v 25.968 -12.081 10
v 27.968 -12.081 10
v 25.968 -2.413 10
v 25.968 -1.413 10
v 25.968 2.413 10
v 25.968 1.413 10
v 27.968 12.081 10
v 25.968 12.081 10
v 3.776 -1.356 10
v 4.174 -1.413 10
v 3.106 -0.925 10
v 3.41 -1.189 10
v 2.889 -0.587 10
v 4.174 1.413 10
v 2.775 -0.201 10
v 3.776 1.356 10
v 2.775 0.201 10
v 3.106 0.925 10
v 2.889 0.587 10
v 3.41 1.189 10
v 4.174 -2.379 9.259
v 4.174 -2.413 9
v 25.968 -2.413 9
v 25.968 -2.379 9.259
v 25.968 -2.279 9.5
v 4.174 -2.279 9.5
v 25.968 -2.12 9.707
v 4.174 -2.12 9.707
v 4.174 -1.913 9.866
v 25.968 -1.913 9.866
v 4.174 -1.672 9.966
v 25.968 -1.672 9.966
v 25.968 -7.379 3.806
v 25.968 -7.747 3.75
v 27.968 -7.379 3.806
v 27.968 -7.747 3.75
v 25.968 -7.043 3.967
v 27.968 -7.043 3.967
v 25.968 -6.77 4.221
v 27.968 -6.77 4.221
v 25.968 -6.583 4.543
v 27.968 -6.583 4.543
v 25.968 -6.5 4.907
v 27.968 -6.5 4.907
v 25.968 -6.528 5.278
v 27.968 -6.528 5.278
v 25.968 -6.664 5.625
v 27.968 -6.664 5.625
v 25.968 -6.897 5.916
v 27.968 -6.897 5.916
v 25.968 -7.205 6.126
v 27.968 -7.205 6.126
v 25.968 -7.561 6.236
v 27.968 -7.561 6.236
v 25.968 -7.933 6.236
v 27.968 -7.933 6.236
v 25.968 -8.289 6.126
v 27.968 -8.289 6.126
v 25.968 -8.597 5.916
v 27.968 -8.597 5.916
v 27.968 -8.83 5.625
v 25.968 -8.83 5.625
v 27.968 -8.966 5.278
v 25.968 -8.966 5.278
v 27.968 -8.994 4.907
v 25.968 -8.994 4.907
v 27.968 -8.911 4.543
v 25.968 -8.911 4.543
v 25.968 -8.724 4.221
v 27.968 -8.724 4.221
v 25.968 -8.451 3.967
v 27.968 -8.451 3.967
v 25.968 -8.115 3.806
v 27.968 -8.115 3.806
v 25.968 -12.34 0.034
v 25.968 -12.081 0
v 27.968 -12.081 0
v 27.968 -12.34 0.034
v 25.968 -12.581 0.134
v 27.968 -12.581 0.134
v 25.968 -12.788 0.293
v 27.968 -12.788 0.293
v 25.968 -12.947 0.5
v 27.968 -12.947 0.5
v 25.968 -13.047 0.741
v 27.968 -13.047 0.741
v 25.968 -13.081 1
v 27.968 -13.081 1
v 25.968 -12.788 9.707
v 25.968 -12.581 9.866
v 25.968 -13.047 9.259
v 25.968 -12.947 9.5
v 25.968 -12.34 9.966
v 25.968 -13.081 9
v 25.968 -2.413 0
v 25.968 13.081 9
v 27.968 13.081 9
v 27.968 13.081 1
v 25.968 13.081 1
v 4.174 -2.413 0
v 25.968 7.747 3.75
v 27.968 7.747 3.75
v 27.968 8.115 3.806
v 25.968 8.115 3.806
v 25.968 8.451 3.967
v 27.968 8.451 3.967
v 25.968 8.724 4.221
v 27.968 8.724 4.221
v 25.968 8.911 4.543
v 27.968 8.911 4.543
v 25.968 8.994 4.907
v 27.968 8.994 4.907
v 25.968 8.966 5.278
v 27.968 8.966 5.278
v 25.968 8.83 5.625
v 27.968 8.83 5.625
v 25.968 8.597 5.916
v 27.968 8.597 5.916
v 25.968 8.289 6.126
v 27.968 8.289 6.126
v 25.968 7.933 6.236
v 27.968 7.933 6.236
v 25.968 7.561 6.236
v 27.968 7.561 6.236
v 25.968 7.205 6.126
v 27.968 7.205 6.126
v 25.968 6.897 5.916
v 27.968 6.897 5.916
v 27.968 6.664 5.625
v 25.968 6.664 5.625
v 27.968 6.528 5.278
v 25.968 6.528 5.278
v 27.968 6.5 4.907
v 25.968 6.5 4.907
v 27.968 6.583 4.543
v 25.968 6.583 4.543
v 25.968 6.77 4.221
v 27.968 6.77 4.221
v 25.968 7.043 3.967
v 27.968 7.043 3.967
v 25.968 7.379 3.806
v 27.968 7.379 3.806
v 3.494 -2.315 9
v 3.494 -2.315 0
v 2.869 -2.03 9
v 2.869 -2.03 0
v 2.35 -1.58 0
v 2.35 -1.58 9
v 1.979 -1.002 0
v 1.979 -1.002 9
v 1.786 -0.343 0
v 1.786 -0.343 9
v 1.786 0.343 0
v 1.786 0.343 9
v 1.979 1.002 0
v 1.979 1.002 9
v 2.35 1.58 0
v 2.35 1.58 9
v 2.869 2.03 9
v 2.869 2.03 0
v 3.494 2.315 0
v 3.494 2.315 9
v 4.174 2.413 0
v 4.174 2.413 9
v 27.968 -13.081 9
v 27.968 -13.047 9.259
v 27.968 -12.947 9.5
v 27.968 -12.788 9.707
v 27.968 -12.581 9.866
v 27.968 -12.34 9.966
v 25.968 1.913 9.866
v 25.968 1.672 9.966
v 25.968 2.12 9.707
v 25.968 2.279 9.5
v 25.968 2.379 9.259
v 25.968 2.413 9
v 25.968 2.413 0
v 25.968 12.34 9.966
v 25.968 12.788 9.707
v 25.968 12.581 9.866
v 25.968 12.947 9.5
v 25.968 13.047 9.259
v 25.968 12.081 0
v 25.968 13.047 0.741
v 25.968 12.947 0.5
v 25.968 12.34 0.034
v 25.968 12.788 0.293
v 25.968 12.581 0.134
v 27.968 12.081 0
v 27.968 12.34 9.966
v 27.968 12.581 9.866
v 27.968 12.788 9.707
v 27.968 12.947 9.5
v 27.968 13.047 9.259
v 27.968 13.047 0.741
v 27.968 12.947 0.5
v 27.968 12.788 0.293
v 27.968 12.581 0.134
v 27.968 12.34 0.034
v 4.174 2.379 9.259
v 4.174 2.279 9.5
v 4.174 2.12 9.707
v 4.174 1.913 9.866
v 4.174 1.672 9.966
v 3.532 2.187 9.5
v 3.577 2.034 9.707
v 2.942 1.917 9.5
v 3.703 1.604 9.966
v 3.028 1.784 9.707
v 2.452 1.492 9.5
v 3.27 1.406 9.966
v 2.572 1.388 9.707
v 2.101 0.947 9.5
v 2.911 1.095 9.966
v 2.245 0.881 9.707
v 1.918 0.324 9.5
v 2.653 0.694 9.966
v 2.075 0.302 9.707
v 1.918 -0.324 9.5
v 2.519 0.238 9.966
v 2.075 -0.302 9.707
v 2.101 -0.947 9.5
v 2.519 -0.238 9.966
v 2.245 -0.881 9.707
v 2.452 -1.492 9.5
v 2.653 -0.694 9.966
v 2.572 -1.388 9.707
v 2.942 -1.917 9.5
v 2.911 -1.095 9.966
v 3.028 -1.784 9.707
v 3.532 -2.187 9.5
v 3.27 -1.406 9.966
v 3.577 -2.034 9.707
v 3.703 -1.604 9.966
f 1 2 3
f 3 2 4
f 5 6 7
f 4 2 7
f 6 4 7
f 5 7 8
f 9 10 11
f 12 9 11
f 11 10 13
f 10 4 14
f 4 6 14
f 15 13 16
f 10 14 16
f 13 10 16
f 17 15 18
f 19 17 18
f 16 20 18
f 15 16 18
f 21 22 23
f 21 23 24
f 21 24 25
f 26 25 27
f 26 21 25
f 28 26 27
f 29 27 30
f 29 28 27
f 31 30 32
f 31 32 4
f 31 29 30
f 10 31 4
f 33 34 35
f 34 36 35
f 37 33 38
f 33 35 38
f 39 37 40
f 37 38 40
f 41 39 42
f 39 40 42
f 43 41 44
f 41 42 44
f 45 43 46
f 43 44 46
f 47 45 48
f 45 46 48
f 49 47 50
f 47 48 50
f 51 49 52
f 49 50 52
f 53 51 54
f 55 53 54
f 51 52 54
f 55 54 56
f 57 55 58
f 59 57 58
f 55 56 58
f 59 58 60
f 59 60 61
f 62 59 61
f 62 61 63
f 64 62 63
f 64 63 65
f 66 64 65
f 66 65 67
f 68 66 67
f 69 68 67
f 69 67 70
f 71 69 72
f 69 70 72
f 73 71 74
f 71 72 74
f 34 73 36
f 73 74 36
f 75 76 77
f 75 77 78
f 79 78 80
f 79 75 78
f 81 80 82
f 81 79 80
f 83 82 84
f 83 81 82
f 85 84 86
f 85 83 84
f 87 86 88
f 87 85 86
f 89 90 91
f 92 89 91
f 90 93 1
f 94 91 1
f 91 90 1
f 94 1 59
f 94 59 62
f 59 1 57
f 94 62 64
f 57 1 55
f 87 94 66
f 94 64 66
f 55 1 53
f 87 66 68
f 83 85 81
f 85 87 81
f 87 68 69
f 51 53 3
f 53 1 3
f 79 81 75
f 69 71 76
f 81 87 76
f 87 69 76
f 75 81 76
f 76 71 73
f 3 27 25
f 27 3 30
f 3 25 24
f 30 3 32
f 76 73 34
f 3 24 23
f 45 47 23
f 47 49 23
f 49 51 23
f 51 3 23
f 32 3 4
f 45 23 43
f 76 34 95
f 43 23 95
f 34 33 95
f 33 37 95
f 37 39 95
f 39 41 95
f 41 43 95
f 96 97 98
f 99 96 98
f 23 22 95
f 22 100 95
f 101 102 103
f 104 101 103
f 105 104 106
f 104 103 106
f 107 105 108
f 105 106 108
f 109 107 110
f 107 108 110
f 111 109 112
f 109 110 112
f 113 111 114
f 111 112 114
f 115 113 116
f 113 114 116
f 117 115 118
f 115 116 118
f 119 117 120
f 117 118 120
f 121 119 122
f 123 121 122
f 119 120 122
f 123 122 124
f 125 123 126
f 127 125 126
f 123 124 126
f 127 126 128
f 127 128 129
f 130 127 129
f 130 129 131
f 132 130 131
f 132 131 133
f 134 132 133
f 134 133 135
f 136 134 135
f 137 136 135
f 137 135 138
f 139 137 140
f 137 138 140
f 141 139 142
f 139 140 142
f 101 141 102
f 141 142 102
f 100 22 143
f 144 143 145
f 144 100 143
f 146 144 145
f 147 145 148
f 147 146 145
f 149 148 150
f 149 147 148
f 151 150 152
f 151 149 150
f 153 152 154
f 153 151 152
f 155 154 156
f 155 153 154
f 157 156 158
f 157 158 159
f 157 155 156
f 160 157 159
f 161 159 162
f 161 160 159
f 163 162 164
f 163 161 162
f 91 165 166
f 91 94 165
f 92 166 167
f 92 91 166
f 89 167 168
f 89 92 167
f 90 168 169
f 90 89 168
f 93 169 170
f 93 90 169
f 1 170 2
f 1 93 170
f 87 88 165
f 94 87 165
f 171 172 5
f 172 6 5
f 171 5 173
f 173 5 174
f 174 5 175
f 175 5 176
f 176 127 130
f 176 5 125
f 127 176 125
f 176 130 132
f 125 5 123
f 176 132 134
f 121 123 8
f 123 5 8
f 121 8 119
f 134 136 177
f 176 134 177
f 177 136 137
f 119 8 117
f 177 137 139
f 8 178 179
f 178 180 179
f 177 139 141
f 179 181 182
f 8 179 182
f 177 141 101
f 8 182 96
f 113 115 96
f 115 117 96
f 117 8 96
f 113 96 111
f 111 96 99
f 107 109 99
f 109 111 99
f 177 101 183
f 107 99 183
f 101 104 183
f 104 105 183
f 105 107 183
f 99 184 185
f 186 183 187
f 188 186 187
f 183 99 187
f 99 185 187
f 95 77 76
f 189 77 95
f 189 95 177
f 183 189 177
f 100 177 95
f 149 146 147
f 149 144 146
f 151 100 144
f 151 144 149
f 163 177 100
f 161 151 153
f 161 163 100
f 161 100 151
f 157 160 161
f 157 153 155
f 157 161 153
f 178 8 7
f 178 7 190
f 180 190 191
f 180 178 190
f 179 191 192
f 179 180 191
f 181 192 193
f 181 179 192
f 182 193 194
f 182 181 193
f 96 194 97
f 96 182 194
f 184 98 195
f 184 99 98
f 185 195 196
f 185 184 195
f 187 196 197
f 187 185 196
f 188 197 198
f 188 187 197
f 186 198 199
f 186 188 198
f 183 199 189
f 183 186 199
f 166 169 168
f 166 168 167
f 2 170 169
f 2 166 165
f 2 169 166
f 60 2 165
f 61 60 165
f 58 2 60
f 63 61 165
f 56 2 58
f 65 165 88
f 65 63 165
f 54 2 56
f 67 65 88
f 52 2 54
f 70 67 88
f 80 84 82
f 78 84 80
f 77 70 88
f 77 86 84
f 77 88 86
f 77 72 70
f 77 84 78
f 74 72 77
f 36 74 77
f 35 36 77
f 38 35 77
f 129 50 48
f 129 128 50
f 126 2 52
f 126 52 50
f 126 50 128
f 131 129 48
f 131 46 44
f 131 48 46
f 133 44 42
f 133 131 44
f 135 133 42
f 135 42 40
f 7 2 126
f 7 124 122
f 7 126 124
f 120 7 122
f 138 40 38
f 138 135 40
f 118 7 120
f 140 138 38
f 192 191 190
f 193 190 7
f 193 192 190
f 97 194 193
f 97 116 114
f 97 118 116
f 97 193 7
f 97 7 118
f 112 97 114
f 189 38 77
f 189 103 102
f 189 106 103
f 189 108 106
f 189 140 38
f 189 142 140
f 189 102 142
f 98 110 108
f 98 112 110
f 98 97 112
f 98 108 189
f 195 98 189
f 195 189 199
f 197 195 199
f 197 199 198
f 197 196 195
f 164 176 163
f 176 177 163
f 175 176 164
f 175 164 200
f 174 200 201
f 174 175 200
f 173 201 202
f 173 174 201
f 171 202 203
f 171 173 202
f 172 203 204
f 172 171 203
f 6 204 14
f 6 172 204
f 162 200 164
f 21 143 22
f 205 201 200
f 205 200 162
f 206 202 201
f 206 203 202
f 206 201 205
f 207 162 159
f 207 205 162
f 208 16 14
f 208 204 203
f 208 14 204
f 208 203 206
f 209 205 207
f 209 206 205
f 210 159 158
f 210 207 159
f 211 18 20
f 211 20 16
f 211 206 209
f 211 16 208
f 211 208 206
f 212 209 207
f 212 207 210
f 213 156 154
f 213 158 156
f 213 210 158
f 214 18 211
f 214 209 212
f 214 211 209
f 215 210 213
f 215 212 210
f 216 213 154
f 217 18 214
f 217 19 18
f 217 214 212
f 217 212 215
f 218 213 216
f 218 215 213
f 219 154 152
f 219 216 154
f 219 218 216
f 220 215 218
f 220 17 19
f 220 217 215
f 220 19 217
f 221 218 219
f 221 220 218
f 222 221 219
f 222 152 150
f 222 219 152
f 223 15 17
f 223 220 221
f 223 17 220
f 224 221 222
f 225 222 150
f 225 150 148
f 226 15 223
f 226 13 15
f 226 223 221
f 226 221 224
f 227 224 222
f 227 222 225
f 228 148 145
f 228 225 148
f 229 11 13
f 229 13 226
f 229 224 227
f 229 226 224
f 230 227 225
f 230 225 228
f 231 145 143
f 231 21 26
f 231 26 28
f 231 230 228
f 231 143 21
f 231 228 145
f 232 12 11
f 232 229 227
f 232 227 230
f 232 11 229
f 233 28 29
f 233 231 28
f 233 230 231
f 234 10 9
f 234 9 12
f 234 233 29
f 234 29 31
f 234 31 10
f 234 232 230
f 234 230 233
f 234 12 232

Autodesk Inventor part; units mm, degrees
ref_plane "YZ Plane" through (0, 0, 0) normal (1, 0, 0) x (0, 1, 0)
ref_plane "XZ Plane" through (0, 0, 0) normal (0, 1, 0) x (-1, 0, 0)
sketch "Sketch1" plane through (0, 0, 0) normal (0, 0, 1) x (1, 0, 0)
  line L0 (-4.826, 0.413) -> (-4.826, -0.413) projected
  line L1 (-2.826, -2.413) -> (4.826, -2.413) projected
  line L2 (4.826, -2.413) -> (4.826, 2.413) projected
  line L3 (4.826, 2.413) -> (-2.826, 2.413) projected
  arc A0 (-4.826, -0.413) -> (-2.826, -2.413) centre (-2.826, -0.413) ccw projected
  arc A1 (-2.826, 2.413) -> (-4.826, 0.413) centre (-2.826, 0.413) ccw projected
  point P0 (0, 0)
extrude "Extrusion1" add sketch "Sketch1" along normal blind 10
sketch "Sketch2" plane through (4.826, -2.413, 0) normal (1, 0, 0) x (0, 0, -1)
  line L0 (0, 0) -> (-10, 0) projected
  line L1 (-10, 0) -> (-10, 4.826) projected
  circle A0 centre (3.175, 150.3292) radius 1.5 projected
  circle A1 centre (3.175, 23.749) radius 1.5 projected
  circle A2 centre (73.025, 23.749) radius 1.5 projected
  circle A3 centre (73.025, 150.3292) radius 1.5 projected
  arc A4 (60.2046, 236.2874) -> (0.9041, 211.5001) centre (77.9391, 110.5317) ccw projected
  ellipse E0 centre (170.686, 87.0391) end of major axis (408.43, 87.0391) minor radius 177.8 (0.9041, 211.5001) -> (0.9041, -37.4219) ccw projected
  arc A5 (0.9041, -37.4219) -> (60.2046, -62.2092) centre (77.9391, 63.5465) ccw projected
  arc A6 (60.2046, -62.2092) -> (281.1673, -62.2092) centre (170.686, 721.2179) ccw projected
  arc A7 (281.1673, -62.2092) -> (340.4678, -37.4219) centre (263.4329, 63.5465) ccw projected
  ellipse E1 centre (170.686, 87.0391) end of major axis (408.43, 87.0391) minor radius 177.8 (340.4678, -37.4219) -> (340.4678, 211.5001) ccw projected
  arc A8 (340.4678, 211.5001) -> (281.1673, 236.2874) centre (263.4329, 110.5317) ccw projected
  arc A9 (281.1673, 236.2874) -> (60.2046, 236.2874) centre (170.686, -547.1397) ccw projected
  circle A10 centre (18.1159, 118.5546) radius 1.25 projected
  circle A11 centre (-51.7341, 53.7756) radius 1.25 projected
  circle A12 centre (18.1159, 53.7756) radius 1.25 projected
  circle A13 centre (-51.7341, 118.5546) radius 1.25 projected
  circle A14 centre (395.605, 77.7641) radius 1.25 projected
  circle A15 centre (321.1037, 62.7821) radius 1.25 projected
  circle A16 centre (321.1037, 101.1361) radius 1.25 projected
  circle A17 centre (395.605, 96.3141) radius 1.25 projected
  line L2 (284.5488, 72.0792) -> (223.628, 72.0792) projected
  line L3 (223.628, 72.0792) -> (223.628, 102.5592) projected
  line L4 (223.628, 102.5592) -> (284.5488, 102.5592) projected
  line L5 (284.5488, 102.5592) -> (284.5488, 72.0792) projected
  circle A18 centre (129.4087, 87.0391) radius 30.4 projected
  line L6 (95.6616, 45.3432) -> (95.6616, 49.3432) projected
  arc A19 (98.6614, 49.3432) -> (95.6616, 49.3432) centre (97.1615, 49.3432) ccw projected
  line L7 (98.6614, 49.3432) -> (98.6614, 45.3432) projected
  arc A20 (95.6616, 45.3432) -> (98.6614, 45.3432) centre (97.1615, 45.3432) ccw projected
  line L8 (160.3503, 45.3892) -> (160.3503, 49.3892) projected
  arc A21 (163.3501, 49.3892) -> (160.3503, 49.3892) centre (161.8502, 49.3892) ccw projected
  line L9 (163.3501, 49.3892) -> (163.3501, 45.3892) projected
  arc A22 (160.3503, 45.3892) -> (163.3501, 45.3892) centre (161.8502, 45.3892) ccw projected
  line L10 (95.5803, 159.8921) -> (95.5803, 163.8921) projected
  arc A23 (98.5801, 163.8921) -> (95.5803, 163.8921) centre (97.0802, 163.8921) ccw projected
  line L11 (98.5801, 163.8921) -> (98.5801, 159.8921) projected
  arc A24 (95.5803, 159.8921) -> (98.5801, 159.8921) centre (97.0802, 159.8921) ccw projected
  line L12 (163.3504, 163.8921) -> (163.3504, 159.8921) projected
  arc A25 (160.3506, 159.8921) -> (163.3504, 159.8921) centre (161.8505, 159.8921) ccw projected
  line L13 (160.3506, 159.8921) -> (160.3506, 163.8921) projected
  arc A26 (163.3504, 163.8921) -> (160.3506, 163.8921) centre (161.8505, 163.8921) ccw projected
  arc A27 (180.3755, 134.9774) -> (180.3753, 131.9798) centre (180.3755, 133.4786) ccw projected
  line L14 (180.3755, 134.9774) -> (184.3754, 134.9776) projected
  arc A28 (184.3754, 131.9796) -> (184.3754, 134.9776) centre (184.3755, 133.4786) ccw projected
  line L15 (184.3754, 131.9796) -> (180.3753, 131.9798) projected
  arc A29 (65.9852, 134.9725) -> (65.9851, 131.9749) centre (65.9852, 133.4737) ccw projected
  line L16 (65.9852, 134.9725) -> (69.9852, 134.9727) projected
  arc A30 (69.9852, 131.9747) -> (69.9852, 134.9727) centre (69.9852, 133.4737) ccw projected
  line L17 (69.9852, 131.9747) -> (65.9851, 131.9749) projected
  arc A31 (188.0254, 134.9778) -> (188.0255, 131.9802) centre (188.0255, 133.479) ccw projected
  line L18 (188.0254, 134.9778) -> (192.0254, 134.978) projected
  arc A32 (192.0254, 131.98) -> (192.0254, 134.978) centre (192.0255, 133.479) ccw projected
  line L19 (192.0254, 131.98) -> (188.0255, 131.9802) projected
  arc A33 (73.6382, 70.1265) -> (73.6381, 67.1289) centre (73.6382, 68.6277) ccw projected
  line L20 (73.6382, 70.1265) -> (77.6381, 70.1267) projected
  arc A34 (77.6381, 67.1287) -> (77.6381, 70.1267) centre (77.6382, 68.6277) ccw projected
  line L21 (77.6381, 67.1287) -> (73.6381, 67.1289) projected
  circle A35 centre (271.4412, 59.8872) radius 1.25 projected
  circle A36 centre (229.978, 118.4342) radius 1.25 projected
  circle A37 centre (281.3738, 108.9092) radius 1.25 projected
  circle A38 centre (278.1988, 118.4342) radius 1.25 projected
  circle A39 centre (254.0826, 118.4342) radius 1.25 projected
  circle A40 centre (226.803, 108.9092) radius 1.25 projected
  circle A41 centre (226.5872, 59.8872) radius 1.25 projected
  arc A42 (188.0714, 70.2078) -> (188.0714, 67.2102) centre (188.0714, 68.709) ccw projected
  line L22 (188.0714, 70.2078) -> (192.0714, 70.208) projected
  arc A43 (192.0714, 67.21) -> (192.0714, 70.208) centre (192.0714, 68.709) ccw projected
  line L23 (192.0714, 67.21) -> (188.0714, 67.2102) projected
  line L24 (73.6352, 134.9725) -> (77.6351, 134.9727) projected
  arc A44 (77.6351, 131.9747) -> (77.6351, 134.9727) centre (77.6352, 133.4737) ccw projected
  line L25 (77.6351, 131.9747) -> (73.6351, 131.9749) projected
  arc A45 (73.6352, 134.9725) -> (73.6351, 131.9749) centre (73.6352, 133.4737) ccw projected
  arc A46 (66.0312, 70.1211) -> (66.0311, 67.1235) centre (66.0312, 68.6223) ccw projected
  line L26 (66.0312, 70.1211) -> (70.0312, 70.1213) projected
  arc A47 (70.0312, 67.1233) -> (70.0312, 70.1213) centre (70.0312, 68.6223) ccw projected
  line L27 (70.0312, 67.1233) -> (66.0311, 67.1235) projected
  arc A48 (180.4215, 70.2024) -> (180.4213, 67.2048) centre (180.4215, 68.7036) ccw projected
  line L28 (180.4215, 70.2024) -> (184.4214, 70.2025) projected
  arc A49 (184.4214, 67.2046) -> (184.4214, 70.2025) centre (184.4215, 68.7036) ccw projected
  line L29 (184.4214, 67.2046) -> (180.4213, 67.2048) projected
  line L30 (160.3503, 152.2421) -> (160.3503, 156.2421) projected
  arc A50 (163.3501, 156.2421) -> (160.3503, 156.2421) centre (161.8502, 156.2421) ccw projected
  line L31 (163.3501, 156.2421) -> (163.3501, 152.2421) projected
  arc A51 (160.3503, 152.2421) -> (163.3501, 152.2421) centre (161.8502, 152.2421) ccw projected
  line L32 (95.5857, 152.1961) -> (95.5857, 156.1961) projected
  arc A52 (98.5855, 156.1961) -> (95.5857, 156.1961) centre (97.0856, 156.1961) ccw projected
  line L33 (98.5855, 156.1961) -> (98.5855, 152.1961) projected
  arc A53 (95.5857, 152.1961) -> (98.5855, 152.1961) centre (97.0856, 152.1961) ccw projected
  line L34 (160.3503, 37.7392) -> (160.3503, 41.7392) projected
  arc A54 (163.3501, 41.7392) -> (160.3503, 41.7392) centre (161.8502, 41.7392) ccw projected
  line L35 (163.3501, 41.7392) -> (163.3501, 37.7392) projected
  arc A55 (160.3503, 37.7392) -> (163.3501, 37.7392) centre (161.8502, 37.7392) ccw projected
  line L36 (95.667, 37.6932) -> (95.667, 41.6932) projected
  arc A56 (98.6669, 41.6932) -> (95.667, 41.6932) centre (97.167, 41.6932) ccw projected
  line L37 (98.6669, 41.6932) -> (98.6669, 37.6932) projected
  arc A57 (95.667, 37.6932) -> (98.6669, 37.6932) centre (97.167, 37.6932) ccw projected
  line L38 (0, 4.826) -> (-10, 4.826) projected
  line L39 (0, -10.668) -> (0, 15.494) projected
  circle A58 centre (-5, -5.334) radius 1.5 projected
  circle A59 centre (81.2, -5.334) radius 1.5 projected
  circle A60 centre (81.2, 10.16) radius 1.5 projected
  circle A61 centre (-5, 10.16) radius 1.5 projected
  circle A62 centre (-5, 163.9182) radius 1.5 projected
  circle A63 centre (81.2, 163.9182) radius 1.5 projected
  circle A64 centre (81.2, 179.4122) radius 1.5 projected
  circle A65 centre (-5, 179.4122) radius 1.5 projected
  circle A66 centre (73.025, 187.9212) radius 1.5 projected
  circle A67 centre (73.025, -13.843) radius 1.5 projected
  circle A68 centre (3.175, -13.843) radius 1.5 projected
  circle A69 centre (3.175, 187.9212) radius 1.5 projected
  circle A70 centre (268.3469, 187.9212) radius 1.5 projected
  circle A71 centre (260.1719, 179.4122) radius 1.5 projected
  circle A72 centre (346.3719, 10.16) radius 1.5 projected
  circle A73 centre (346.3719, -5.334) radius 1.5 projected
  circle A74 centre (346.3719, 179.4122) radius 1.5 projected
  circle A75 centre (338.1969, 150.3292) radius 1.5 projected
  circle A76 centre (260.1719, -5.334) radius 1.5 projected
  circle A77 centre (268.3469, 23.749) radius 1.5 projected
  circle A78 centre (268.3469, -13.843) radius 1.5 projected
  circle A79 centre (260.1719, 10.16) radius 1.5 projected
  circle A80 centre (268.3469, 150.3292) radius 1.5 projected
  circle A81 centre (338.1969, -13.843) radius 1.5 projected
  circle A82 centre (338.1969, 23.749) radius 1.5 projected
  circle A83 centre (260.1719, 163.9182) radius 1.5 projected
  circle A84 centre (338.1969, 187.9212) radius 1.5 projected
  circle A85 centre (346.3719, 163.9182) radius 1.25 projected
  point P0 (0, 2.413)
ref_plane "Work Plane1" through (27.9676, -72.374, -408.43) normal (-1, 0, 0) x (0, 0, 1)
extrude "Extrusion2" add sketch "Sketch2" along normal up to surface (23.1416 mm away) contours L0 L1 L38 L39
sketch "Sketch3" plane through (27.9676, -2.413, 10) normal (1, 0, 0) x (0, 0, -1)
  line L0 (10, -10.668) -> (10, 15.494) projected
  line L1 (10, -10.668) -> (0, -10.668)
  line L2 (0, -10.668) -> (0, 15.494)
  line L3 (0, 15.494) -> (10, 15.494)
  line L4 (10, 15.494) -> (10, -10.668)
  line L5 (10, 2.826) -> (10, 2) projected
  line L6 (10, 0) -> (10, -10.668)
  line L7 (10, 4.826) -> (10, 15.494)
  circle A0 centre (5, -5.334) radius 1.25
  circle A1 centre (5, 10.16) radius 1.25
  point P0 (10, 2.413)
  point P1 (5, -10.668)
  point P2 (5, 15.494)
  point P3 (10, -5.334)
  point P4 (10, 10.16)
  dimension "d4" = 2.5
  dimension "d5" = 2.5
extrude "Extrusion3" add sketch "Sketch3" against normal blind 2
sketch "Sketch4" plane through (0, 0, 0) normal (0, 0, -1) x (-1, 0, 0)
  circle A0 centre (-4.174, 0) radius 2.3
  line L0 (-4.174, 2.3) -> (-4.174, 2.413)
  line L1 (2.826, 2.413) -> (-25.9676, 2.413) projected
  line L2 (-4.174, -2.3) -> (-4.174, -2.413)
  line L3 (2.826, -2.413) -> (-25.9676, -2.413) projected
  line L4 (-25.9676, 2.413) -> (-25.9676, -2.413)
  line L5 (-4.174, -2.413) -> (-4.174, 2.413)
  line L6 (2.826, -2.413) -> (-25.9676, -2.413) projected
  arc A1 (4.826, -0.413) -> (2.826, -2.413) centre (2.826, -0.413) ccw projected
  line L7 (4.826, 0.413) -> (4.826, -0.413) projected
  arc A2 (2.826, 2.413) -> (4.826, 0.413) centre (2.826, 0.413) ccw projected
  line L8 (2.826, 2.413) -> (-25.9676, 2.413) projected
  line L9 (-27.9676, 13.081) -> (-25.9676, 13.081) projected
  line L10 (-27.9676, -13.081) -> (-27.9676, 13.081) projected
  line L11 (-27.9676, -13.081) -> (-25.9676, -13.081) projected
  line L12 (-25.9676, -2.413) -> (-25.9676, -13.081) projected
  line L13 (-4.174, 2.413) -> (11.7475, 2.413)
  line L14 (11.7475, 2.413) -> (11.7475, -2.413)
  line L15 (11.7475, -2.413) -> (-4.174, -2.413)
  point P0 (0, 0)
extrude "Extrusion4" cut sketch "Sketch4" against normal blind 10 contours A0 L5 | A0 L0 L1 A2 A1 L3 L2 | A2 L7 A1 | A1 A2 | L13 L14 L15 A1 A2 picked at (-3.8414, 0.6907)
sketch "Sketch5" plane through (0, 0, 0) normal (0, 0, -1) x (-1, 0, 0)
  circle A0 centre (-4.174, 0) radius 2.413
  point P0 (0, 0)
extrude "Extrusion5" add sketch "Sketch5" against normal blind 10
fillet "Fillet2" radius 1 1 edges at (1.761, 0, 10)
fillet "Fillet3" radius 1 4 edges at (26.9676, 13.081, 10) (26.9676, 13.081, 0) (26.9676, -13.081, 10) (26.9676, -13.081, 0)
properties part number "GuideArmConnector"
